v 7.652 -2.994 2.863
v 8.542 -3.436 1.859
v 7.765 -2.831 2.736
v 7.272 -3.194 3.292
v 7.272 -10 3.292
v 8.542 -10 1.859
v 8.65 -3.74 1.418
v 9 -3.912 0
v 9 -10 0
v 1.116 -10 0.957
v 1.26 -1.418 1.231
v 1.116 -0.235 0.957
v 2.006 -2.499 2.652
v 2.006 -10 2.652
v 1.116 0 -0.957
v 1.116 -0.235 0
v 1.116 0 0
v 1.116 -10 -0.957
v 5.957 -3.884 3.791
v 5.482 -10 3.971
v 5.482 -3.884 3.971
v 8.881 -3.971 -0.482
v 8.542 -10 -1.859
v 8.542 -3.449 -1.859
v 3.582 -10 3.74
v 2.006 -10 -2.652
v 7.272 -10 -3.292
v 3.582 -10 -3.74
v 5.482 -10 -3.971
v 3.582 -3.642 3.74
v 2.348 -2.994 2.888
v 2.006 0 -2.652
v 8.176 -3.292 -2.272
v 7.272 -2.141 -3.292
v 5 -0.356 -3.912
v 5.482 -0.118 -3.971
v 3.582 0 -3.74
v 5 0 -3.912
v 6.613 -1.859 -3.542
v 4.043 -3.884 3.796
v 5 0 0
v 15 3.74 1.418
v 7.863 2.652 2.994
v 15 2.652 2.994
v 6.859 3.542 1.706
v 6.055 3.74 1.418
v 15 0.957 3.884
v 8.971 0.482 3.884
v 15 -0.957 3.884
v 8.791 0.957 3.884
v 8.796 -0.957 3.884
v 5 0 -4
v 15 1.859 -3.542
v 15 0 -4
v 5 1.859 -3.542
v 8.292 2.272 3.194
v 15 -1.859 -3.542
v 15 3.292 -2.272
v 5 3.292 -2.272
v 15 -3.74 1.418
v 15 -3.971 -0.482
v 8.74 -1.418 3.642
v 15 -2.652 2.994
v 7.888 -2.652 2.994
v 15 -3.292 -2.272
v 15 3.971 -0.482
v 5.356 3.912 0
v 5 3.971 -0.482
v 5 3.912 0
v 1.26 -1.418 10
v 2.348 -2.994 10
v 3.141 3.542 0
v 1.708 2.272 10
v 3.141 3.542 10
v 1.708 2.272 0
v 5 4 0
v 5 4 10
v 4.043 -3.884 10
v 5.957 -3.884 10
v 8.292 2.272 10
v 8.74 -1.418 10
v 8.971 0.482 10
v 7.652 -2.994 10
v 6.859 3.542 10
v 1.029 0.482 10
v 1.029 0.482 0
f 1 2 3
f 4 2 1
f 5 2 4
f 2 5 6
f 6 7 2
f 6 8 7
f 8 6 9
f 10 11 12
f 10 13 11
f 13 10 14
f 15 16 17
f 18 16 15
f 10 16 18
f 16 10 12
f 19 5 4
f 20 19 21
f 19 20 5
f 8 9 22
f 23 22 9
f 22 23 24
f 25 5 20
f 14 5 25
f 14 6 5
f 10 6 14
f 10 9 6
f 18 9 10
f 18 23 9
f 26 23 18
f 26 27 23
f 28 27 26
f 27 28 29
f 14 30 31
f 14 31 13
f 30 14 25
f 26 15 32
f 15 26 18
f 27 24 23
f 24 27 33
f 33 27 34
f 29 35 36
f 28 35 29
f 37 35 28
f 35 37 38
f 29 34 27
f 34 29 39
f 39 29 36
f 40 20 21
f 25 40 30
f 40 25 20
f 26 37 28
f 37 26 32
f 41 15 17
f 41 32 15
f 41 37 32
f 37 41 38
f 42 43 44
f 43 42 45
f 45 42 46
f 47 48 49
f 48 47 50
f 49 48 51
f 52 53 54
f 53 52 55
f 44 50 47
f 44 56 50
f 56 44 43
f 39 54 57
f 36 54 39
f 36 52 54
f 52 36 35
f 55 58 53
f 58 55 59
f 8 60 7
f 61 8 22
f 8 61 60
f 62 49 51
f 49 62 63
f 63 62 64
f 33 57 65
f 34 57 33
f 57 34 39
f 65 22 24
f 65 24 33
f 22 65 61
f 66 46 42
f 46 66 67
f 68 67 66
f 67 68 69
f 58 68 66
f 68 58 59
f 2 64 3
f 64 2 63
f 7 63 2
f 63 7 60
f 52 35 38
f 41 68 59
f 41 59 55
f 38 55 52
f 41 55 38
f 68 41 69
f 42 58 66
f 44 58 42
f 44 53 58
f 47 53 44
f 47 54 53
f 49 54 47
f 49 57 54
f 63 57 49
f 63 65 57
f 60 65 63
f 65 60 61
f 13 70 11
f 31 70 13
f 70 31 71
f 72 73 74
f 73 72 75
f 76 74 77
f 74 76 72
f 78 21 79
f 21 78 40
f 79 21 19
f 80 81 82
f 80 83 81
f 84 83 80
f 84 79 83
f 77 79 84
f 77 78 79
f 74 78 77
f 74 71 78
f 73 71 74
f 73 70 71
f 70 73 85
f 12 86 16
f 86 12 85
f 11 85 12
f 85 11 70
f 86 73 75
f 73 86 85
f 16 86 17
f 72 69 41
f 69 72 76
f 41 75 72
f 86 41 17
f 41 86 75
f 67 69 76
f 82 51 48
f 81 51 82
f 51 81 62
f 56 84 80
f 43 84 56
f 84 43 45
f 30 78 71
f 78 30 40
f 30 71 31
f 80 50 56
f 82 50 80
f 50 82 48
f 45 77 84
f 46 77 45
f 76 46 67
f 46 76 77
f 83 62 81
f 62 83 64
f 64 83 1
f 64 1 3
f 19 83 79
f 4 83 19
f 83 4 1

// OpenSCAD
translate([5, 0, 0]) {
  rotate([90, 0, 0]) {
    cylinder(h=10, r1=4, r2=4);
  } 
}

translate([5, 0, 0]) {
  rotate([0, 90, 0]) {
    cylinder(h=10, r1=4, r2=4);
  }  
}

translate([5, 0, 0]) {
  rotate([0, 0, 90]) {
    cylinder(h=10, r1=4, r2=4);
  }  
}
